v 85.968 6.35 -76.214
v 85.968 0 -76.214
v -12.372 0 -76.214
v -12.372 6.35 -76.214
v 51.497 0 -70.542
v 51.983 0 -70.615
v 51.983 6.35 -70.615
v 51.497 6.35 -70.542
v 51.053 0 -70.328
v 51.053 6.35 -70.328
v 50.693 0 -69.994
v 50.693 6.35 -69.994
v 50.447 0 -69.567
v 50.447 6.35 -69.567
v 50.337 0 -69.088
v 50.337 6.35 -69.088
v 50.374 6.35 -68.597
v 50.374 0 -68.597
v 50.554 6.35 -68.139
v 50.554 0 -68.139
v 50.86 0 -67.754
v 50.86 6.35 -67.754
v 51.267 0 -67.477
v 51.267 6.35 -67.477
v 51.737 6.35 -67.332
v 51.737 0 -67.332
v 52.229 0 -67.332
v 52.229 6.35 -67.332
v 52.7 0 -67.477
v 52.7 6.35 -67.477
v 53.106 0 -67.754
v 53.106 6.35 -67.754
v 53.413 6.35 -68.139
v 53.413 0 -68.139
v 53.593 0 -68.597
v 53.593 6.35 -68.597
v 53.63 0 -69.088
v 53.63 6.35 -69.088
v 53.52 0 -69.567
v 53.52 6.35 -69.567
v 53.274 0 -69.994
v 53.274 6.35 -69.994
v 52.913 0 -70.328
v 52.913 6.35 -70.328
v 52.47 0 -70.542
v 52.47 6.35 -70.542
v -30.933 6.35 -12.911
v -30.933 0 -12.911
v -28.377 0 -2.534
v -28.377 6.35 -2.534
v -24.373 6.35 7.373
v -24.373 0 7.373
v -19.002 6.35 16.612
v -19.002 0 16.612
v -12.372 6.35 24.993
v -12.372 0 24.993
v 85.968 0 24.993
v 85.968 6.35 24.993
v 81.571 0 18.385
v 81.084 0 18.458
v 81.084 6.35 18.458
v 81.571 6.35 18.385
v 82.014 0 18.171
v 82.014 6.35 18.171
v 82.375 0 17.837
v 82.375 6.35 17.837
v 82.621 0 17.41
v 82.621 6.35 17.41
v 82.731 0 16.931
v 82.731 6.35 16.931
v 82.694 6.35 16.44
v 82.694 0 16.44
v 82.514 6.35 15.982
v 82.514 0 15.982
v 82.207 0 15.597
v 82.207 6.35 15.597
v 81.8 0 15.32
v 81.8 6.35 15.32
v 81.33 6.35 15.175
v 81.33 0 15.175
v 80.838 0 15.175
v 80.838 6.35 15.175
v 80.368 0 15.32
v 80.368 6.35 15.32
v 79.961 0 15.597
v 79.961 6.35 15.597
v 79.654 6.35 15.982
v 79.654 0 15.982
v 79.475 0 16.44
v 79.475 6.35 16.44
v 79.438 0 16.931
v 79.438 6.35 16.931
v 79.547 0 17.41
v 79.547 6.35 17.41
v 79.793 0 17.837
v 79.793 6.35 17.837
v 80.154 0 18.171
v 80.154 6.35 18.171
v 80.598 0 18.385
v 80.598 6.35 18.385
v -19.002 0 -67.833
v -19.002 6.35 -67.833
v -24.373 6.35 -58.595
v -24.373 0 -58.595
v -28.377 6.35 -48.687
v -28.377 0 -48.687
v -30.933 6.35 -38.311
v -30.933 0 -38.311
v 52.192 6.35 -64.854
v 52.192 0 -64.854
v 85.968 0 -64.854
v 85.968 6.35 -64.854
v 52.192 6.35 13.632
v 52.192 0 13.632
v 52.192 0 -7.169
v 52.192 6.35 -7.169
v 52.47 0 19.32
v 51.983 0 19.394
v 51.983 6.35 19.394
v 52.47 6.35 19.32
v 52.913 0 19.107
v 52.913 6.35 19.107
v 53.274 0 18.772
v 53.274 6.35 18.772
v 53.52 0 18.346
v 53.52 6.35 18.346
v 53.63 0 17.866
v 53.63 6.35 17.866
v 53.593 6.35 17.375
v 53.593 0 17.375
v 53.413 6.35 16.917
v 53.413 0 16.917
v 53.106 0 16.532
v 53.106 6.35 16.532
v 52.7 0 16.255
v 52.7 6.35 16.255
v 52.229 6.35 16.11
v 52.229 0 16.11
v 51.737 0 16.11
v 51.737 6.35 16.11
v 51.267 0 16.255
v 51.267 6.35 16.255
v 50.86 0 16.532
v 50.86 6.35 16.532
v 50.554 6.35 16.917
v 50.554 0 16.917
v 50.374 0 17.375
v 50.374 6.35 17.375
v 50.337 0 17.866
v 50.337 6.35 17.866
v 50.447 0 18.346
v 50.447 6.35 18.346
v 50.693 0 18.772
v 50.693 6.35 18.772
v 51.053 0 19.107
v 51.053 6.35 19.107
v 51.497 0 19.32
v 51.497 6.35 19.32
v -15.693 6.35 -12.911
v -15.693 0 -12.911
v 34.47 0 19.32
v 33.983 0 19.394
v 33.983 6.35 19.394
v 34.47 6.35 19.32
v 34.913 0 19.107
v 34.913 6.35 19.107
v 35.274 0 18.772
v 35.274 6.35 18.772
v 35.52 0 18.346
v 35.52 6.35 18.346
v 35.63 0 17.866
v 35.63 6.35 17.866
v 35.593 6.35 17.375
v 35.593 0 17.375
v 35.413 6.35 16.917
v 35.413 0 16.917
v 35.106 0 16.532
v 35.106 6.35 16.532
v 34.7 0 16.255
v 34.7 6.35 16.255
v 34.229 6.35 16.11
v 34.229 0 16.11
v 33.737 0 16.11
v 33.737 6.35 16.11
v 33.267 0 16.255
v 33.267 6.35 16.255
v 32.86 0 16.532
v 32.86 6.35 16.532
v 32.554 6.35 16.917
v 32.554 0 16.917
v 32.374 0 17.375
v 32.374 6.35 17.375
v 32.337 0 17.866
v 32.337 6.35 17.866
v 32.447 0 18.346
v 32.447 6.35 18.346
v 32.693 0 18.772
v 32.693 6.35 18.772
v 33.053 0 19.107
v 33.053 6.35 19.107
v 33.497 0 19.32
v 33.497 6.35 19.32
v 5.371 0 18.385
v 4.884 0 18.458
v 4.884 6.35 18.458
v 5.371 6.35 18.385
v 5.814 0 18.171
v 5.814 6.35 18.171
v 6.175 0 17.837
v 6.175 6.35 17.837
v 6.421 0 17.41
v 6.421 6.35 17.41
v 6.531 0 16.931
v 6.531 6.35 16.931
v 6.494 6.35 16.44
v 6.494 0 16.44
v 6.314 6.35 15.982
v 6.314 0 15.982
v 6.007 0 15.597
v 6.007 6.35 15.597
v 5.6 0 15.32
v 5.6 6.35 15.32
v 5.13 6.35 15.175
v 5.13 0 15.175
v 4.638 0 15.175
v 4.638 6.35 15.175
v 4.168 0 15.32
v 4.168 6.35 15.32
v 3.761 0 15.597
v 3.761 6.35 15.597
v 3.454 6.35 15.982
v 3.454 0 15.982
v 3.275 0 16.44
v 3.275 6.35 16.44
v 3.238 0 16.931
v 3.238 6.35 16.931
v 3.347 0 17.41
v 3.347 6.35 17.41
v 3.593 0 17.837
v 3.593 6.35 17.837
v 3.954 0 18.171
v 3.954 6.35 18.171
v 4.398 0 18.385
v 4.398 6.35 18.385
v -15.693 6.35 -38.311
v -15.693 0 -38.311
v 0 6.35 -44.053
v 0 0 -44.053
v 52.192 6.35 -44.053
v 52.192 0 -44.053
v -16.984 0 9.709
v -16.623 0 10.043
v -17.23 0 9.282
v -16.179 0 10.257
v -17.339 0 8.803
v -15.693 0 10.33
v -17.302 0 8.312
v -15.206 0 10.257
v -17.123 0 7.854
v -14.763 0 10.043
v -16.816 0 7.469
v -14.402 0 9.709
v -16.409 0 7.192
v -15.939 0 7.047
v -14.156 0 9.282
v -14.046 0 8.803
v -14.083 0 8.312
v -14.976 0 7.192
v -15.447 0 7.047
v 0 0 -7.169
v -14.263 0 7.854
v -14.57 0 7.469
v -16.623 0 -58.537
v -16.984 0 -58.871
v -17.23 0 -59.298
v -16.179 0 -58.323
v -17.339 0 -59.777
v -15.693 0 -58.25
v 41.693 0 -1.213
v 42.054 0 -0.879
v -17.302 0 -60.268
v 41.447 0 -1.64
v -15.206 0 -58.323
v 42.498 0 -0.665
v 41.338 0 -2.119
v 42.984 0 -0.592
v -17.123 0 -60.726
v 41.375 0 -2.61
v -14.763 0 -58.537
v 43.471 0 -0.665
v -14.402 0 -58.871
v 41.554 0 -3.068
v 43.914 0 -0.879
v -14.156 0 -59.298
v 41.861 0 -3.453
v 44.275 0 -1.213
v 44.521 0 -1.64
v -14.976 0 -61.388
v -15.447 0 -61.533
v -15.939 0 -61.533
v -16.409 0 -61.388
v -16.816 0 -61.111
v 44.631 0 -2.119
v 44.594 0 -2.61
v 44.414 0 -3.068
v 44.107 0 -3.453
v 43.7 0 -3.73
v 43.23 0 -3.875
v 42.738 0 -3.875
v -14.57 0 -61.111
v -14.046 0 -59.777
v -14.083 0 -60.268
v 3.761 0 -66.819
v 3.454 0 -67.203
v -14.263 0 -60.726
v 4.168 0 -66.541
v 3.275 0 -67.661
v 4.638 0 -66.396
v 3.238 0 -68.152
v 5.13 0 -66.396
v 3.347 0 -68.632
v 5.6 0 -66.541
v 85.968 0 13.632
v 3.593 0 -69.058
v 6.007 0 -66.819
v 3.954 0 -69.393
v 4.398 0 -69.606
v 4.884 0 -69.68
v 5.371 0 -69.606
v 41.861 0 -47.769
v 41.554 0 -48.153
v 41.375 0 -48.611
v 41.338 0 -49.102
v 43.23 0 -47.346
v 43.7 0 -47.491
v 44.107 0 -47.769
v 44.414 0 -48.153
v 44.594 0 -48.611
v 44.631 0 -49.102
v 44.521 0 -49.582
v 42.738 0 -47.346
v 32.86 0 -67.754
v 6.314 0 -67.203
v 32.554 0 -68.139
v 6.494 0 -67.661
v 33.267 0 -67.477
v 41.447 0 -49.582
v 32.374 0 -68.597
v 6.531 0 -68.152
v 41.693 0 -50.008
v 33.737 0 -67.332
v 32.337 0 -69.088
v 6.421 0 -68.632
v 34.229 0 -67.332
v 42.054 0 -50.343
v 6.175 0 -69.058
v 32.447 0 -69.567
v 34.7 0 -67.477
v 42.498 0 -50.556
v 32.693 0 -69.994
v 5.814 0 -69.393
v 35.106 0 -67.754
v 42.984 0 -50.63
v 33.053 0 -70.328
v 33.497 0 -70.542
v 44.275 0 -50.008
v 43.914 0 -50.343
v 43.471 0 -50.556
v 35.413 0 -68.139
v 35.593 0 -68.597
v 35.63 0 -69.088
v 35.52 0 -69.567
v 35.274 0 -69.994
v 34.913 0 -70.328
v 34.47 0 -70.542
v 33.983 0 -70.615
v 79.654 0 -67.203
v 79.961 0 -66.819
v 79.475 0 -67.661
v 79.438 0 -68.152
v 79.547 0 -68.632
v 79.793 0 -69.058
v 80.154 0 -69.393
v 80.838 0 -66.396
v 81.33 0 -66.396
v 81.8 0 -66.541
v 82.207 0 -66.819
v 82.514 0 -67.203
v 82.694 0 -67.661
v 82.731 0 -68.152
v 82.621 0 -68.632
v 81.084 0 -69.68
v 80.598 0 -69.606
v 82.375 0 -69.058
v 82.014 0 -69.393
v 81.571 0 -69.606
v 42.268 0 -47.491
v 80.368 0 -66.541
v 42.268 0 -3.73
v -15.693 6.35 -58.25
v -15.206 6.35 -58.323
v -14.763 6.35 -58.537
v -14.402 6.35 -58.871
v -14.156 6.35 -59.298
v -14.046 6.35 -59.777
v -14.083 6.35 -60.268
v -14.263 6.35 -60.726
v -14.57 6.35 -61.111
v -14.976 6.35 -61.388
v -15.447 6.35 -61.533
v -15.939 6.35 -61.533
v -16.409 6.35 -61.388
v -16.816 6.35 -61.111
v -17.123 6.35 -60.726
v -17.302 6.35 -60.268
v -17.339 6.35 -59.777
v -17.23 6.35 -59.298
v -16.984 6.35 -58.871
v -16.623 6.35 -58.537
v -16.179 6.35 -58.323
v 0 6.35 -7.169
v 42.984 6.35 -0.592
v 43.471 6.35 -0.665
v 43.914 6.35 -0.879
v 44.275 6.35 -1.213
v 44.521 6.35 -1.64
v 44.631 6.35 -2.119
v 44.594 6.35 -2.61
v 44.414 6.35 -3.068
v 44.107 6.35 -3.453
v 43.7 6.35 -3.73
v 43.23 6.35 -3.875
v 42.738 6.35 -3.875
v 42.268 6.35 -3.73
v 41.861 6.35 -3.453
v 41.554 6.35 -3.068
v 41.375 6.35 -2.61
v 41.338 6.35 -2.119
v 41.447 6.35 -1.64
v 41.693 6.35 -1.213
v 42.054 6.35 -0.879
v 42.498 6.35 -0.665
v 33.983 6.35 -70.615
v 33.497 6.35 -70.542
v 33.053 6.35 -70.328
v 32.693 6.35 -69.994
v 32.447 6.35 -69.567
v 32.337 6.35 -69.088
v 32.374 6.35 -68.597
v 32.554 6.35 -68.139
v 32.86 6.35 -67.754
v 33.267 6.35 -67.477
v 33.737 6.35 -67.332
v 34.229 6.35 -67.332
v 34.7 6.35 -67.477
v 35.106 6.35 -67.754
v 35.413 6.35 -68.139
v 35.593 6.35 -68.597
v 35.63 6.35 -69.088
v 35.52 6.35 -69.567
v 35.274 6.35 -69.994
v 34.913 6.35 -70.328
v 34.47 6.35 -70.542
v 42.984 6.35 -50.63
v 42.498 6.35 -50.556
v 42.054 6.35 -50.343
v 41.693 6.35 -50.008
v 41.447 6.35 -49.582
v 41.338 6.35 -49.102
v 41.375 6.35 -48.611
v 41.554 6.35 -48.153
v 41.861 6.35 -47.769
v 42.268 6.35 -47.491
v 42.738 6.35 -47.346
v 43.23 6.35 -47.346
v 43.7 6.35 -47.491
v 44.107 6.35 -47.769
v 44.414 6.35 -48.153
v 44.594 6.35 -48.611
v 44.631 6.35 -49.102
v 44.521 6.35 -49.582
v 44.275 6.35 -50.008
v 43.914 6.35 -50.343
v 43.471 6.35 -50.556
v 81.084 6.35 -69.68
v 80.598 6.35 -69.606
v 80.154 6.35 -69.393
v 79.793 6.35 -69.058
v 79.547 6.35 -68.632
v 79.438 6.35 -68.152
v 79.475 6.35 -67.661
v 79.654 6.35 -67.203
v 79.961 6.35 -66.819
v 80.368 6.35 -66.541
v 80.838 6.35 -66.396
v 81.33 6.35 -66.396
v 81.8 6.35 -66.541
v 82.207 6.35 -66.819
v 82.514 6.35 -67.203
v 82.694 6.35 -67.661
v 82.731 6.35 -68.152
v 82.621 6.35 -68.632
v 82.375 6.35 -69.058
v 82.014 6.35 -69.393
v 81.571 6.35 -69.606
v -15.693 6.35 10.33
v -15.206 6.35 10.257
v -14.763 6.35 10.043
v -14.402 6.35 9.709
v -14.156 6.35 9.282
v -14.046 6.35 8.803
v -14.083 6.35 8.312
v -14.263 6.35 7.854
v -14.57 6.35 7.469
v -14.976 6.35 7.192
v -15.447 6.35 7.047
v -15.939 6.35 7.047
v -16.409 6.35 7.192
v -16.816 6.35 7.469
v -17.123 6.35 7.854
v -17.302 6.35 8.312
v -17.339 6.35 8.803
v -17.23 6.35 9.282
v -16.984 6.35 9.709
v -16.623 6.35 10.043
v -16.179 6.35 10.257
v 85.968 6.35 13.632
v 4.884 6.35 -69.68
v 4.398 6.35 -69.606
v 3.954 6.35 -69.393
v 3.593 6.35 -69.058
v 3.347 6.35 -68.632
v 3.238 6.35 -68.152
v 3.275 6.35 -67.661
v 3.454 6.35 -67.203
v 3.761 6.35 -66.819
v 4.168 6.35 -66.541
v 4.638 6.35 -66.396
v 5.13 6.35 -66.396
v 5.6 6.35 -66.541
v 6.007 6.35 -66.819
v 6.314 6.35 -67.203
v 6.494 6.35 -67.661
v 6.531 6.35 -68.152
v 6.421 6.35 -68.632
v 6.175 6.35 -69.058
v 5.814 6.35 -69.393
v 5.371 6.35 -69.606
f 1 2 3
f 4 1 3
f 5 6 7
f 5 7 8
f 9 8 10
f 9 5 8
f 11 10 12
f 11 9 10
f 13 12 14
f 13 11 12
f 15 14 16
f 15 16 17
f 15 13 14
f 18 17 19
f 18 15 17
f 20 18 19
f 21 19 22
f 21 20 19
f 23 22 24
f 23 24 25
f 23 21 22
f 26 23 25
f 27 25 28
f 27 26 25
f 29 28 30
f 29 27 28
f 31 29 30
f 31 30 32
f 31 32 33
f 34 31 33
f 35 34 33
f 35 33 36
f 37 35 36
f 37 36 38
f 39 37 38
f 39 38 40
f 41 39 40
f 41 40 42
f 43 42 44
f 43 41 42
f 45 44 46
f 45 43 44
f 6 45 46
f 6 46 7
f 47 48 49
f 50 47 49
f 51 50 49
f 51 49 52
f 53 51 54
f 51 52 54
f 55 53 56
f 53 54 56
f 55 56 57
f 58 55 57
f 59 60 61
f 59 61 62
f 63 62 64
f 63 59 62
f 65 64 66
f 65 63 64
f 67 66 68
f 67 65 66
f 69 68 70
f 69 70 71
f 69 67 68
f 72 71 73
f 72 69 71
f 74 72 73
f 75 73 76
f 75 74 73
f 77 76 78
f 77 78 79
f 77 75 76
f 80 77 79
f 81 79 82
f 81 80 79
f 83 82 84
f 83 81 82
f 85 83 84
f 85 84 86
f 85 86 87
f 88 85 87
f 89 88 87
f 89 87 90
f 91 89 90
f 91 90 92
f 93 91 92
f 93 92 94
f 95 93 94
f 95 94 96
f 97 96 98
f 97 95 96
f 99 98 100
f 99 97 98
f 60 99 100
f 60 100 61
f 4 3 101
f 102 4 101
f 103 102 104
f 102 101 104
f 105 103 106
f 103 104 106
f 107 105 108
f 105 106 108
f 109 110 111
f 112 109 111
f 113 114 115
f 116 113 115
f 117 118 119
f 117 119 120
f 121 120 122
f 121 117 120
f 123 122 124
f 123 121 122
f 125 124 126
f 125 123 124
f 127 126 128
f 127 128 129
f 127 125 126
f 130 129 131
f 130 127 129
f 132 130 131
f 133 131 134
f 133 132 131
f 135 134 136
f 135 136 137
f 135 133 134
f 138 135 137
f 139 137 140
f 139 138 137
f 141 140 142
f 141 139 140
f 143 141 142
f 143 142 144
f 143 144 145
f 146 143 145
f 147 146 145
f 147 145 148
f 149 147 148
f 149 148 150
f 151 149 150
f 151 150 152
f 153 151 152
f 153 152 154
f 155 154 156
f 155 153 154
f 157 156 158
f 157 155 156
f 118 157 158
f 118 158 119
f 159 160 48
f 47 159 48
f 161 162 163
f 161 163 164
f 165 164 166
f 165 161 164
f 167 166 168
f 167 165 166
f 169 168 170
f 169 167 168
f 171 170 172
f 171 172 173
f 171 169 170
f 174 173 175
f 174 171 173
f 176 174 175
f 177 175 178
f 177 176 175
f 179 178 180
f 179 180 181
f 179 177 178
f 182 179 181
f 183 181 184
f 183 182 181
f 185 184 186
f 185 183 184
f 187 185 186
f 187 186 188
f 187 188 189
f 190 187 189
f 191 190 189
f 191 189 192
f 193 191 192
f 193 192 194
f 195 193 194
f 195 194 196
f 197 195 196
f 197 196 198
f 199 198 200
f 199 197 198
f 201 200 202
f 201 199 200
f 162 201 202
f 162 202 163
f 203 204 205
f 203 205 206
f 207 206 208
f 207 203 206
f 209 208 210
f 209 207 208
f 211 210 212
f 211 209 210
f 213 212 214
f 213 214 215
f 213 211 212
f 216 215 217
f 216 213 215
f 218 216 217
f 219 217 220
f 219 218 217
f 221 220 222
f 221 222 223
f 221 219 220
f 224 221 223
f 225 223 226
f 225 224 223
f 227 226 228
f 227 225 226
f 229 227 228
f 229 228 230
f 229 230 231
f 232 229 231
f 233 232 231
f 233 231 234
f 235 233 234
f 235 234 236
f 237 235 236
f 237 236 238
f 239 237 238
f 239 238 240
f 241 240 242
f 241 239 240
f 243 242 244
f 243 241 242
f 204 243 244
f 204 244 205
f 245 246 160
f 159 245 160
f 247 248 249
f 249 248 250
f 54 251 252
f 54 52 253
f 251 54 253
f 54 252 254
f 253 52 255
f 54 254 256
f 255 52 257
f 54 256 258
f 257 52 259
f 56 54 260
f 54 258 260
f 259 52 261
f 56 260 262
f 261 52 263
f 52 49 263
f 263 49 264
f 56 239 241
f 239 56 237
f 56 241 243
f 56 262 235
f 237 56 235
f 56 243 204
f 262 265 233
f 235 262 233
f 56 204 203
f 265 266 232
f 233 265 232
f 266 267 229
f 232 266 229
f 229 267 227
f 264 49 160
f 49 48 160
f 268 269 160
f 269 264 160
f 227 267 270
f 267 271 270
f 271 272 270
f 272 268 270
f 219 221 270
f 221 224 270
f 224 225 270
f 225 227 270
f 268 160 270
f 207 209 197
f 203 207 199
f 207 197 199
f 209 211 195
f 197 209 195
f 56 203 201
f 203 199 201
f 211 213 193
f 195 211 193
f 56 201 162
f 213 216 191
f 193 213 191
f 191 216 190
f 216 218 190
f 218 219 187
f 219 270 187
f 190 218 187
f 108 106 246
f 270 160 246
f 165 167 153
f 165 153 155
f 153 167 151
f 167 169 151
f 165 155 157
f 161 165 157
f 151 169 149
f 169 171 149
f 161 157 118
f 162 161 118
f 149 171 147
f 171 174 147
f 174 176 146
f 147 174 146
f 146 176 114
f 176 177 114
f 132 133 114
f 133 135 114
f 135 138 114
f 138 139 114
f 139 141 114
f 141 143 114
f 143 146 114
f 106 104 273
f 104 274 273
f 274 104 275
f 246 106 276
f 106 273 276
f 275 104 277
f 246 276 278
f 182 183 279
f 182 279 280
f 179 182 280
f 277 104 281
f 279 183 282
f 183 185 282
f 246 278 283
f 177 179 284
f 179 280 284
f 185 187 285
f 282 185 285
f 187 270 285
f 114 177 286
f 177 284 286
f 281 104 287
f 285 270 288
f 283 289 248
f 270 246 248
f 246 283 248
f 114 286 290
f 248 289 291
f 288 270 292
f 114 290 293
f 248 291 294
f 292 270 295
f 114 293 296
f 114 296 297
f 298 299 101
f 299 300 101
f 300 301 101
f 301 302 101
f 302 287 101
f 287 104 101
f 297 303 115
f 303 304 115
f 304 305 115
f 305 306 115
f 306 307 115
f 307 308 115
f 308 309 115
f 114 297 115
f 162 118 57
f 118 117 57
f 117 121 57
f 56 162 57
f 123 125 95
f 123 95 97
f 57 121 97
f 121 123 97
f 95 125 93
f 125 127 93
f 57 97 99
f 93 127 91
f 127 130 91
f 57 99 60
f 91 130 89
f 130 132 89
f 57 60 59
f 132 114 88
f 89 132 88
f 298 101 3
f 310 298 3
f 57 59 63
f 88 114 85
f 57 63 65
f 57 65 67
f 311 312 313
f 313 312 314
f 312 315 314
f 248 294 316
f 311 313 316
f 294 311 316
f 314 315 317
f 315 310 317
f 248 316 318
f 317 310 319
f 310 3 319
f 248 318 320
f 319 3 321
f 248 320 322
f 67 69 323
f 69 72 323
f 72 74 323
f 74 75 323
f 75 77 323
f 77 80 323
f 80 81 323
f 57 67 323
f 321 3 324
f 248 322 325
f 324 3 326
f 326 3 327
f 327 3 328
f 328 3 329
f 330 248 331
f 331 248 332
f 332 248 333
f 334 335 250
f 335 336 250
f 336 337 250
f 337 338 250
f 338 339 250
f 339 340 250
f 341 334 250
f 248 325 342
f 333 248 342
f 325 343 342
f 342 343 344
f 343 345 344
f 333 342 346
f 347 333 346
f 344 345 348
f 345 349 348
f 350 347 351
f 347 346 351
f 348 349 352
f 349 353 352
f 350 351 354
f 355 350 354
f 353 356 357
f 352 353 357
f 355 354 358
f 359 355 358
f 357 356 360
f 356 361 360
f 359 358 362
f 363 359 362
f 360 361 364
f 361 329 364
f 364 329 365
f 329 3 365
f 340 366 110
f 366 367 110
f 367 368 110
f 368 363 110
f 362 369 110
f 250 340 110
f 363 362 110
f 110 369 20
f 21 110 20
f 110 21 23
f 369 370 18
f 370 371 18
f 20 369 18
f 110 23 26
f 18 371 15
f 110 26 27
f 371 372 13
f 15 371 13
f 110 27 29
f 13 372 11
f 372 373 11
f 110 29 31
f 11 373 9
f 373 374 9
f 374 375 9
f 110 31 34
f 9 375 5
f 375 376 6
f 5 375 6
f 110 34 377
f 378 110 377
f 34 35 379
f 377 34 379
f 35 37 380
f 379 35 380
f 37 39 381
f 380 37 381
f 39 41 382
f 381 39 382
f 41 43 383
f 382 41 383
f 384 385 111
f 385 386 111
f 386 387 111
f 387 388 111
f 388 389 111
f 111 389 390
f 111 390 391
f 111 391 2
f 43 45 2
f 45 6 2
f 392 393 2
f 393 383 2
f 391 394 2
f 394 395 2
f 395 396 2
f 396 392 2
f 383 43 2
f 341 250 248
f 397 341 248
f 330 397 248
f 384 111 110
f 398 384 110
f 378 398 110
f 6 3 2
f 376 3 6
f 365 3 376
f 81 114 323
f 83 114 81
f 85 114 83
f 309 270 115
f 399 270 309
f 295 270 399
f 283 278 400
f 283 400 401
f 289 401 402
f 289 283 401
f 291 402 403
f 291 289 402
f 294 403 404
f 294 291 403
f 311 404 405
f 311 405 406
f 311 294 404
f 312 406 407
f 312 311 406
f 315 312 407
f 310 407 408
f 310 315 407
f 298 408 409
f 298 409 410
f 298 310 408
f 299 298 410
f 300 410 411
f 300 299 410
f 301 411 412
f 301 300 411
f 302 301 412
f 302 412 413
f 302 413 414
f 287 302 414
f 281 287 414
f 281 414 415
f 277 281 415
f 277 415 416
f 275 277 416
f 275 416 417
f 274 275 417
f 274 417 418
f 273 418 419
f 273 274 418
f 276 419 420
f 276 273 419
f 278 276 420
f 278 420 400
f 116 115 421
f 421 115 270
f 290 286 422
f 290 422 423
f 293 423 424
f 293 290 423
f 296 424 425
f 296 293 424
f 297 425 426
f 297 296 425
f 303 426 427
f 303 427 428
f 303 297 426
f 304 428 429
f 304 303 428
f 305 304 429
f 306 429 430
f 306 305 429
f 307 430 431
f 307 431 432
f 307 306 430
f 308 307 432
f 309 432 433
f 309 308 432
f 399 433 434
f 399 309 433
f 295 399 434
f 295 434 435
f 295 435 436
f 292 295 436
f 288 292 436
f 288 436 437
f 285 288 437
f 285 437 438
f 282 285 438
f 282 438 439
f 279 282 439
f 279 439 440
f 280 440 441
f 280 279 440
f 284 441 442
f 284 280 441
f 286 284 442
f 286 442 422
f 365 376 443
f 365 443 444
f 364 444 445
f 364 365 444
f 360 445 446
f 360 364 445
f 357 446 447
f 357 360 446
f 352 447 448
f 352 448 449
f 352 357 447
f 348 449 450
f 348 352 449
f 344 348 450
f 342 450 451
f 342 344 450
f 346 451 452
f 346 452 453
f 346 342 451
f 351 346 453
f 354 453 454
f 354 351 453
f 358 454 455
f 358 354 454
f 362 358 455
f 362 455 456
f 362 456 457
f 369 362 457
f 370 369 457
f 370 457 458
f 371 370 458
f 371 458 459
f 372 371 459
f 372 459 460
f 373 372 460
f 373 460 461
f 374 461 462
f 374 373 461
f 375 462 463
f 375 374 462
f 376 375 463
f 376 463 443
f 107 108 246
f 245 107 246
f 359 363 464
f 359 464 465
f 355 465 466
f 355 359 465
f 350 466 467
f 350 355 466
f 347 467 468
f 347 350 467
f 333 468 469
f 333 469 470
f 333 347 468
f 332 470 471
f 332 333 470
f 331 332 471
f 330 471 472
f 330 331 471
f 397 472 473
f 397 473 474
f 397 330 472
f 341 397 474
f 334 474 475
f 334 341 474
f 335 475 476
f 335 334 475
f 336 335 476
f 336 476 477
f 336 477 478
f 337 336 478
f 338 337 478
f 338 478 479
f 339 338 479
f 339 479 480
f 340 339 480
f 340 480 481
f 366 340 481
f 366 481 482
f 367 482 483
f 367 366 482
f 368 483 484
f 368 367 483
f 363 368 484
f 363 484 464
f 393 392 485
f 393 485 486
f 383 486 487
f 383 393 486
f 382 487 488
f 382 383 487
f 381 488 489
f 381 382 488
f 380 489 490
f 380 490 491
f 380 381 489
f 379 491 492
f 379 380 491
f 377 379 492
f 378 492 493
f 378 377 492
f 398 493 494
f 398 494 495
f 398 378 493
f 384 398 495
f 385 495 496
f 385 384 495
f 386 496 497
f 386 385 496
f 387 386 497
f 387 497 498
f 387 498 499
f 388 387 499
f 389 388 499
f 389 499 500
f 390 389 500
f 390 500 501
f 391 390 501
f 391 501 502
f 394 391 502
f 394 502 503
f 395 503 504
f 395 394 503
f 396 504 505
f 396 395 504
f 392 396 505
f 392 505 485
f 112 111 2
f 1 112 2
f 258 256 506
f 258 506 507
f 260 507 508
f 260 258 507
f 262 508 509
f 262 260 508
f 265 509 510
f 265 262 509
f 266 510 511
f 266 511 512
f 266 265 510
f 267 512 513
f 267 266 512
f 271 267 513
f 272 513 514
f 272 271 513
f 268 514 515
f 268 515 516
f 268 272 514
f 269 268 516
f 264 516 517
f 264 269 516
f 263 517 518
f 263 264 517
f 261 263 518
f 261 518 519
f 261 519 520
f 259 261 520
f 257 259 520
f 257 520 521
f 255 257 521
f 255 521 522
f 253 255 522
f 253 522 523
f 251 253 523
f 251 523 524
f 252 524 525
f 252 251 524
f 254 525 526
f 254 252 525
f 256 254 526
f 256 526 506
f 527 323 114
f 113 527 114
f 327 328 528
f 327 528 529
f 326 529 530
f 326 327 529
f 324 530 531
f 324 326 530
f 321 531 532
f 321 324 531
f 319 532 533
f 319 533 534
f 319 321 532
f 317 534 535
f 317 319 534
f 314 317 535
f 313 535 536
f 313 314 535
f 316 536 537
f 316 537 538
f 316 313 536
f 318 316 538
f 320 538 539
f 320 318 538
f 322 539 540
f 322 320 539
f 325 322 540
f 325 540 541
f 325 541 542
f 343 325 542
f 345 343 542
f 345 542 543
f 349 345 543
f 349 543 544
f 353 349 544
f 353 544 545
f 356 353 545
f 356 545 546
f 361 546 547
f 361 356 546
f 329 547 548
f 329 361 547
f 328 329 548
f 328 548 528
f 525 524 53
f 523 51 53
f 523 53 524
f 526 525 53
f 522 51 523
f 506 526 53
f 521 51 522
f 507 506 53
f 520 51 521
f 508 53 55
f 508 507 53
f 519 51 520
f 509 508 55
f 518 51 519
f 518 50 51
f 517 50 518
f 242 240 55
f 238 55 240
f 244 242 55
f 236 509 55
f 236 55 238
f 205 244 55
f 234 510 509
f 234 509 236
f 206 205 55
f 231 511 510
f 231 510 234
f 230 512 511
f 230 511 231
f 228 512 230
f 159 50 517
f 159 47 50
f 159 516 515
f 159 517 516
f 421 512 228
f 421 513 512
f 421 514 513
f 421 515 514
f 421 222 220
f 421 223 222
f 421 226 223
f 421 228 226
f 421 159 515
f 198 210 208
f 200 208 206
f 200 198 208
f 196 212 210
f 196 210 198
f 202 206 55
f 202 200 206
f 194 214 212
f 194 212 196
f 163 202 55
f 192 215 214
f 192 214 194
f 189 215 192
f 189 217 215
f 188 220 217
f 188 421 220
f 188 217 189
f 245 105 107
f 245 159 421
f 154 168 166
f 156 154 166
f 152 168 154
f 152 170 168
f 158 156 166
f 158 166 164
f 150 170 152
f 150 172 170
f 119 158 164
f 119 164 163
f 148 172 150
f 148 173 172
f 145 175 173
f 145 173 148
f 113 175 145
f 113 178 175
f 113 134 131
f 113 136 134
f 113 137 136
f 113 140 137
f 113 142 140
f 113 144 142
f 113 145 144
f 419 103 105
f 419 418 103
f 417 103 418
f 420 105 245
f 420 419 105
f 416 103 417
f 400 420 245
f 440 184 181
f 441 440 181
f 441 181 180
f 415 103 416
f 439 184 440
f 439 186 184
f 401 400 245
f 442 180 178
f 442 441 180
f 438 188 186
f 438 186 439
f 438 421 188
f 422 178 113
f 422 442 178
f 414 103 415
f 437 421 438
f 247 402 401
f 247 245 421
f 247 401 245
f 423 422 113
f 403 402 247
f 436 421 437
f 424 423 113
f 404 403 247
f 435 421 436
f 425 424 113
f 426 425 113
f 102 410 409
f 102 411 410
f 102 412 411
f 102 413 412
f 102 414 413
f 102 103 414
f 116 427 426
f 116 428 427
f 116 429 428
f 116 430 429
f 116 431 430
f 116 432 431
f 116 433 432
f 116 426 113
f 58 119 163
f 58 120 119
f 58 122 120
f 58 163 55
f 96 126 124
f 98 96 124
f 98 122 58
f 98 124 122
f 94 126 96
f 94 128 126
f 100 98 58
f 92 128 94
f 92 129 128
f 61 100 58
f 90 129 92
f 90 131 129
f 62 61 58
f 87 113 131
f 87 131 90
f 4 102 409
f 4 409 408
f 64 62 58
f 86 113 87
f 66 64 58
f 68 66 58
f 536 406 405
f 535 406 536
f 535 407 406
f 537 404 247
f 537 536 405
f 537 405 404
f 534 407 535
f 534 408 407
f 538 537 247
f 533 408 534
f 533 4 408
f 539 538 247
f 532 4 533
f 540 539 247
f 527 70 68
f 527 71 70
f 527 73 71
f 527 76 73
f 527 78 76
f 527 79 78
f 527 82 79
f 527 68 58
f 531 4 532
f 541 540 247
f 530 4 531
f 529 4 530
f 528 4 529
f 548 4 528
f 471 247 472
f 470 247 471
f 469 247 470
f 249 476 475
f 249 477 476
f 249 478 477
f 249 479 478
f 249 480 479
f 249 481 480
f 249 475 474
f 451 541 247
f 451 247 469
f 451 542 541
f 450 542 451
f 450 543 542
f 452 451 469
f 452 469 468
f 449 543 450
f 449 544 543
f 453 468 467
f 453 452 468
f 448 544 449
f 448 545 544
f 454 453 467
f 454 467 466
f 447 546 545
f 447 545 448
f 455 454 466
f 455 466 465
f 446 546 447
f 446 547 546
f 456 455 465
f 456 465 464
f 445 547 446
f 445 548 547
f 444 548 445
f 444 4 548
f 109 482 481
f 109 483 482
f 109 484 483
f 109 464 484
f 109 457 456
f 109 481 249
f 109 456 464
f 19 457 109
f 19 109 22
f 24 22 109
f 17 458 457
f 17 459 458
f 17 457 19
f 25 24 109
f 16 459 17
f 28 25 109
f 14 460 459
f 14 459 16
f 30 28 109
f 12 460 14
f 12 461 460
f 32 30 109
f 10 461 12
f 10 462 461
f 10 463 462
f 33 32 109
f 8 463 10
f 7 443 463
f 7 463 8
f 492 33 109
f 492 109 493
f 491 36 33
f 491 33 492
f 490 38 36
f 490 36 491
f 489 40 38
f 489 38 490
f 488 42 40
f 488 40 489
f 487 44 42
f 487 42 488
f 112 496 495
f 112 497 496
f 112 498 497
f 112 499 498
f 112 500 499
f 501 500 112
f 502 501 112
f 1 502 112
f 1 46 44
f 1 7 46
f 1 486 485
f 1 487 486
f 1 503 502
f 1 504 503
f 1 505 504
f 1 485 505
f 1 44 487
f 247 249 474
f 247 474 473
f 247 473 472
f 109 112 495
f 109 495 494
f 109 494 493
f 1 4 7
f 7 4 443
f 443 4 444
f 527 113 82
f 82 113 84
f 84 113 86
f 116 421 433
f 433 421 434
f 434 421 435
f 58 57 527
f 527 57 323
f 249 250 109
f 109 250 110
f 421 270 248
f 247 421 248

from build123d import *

# Parameters (mm, degrees)
SKETCH1_R           = 1.651
BOSS_EXTRUDE1_DEPTH = 6.35


with BuildPart() as part:
    # Sketch1 → Boss-Extrude1 (new body)
    with BuildSketch(Plane(origin=(0, 0, 0), x_dir=(1, 0, 0), z_dir=(0, 1, 0))):
        with BuildLine():
            Line((33.776652136, 7.168881649), (0, 7.168881649))
            Line((0, 7.168881649), (0, 44.052727236))
            Line((0, 44.052727236), (33.776652136, 44.052727236))
            Line((33.776652136, 44.052727236), (52.191652136, 44.052727236))
            Line((52.191652136, 44.052727236), (52.191652136, 64.853804442))
            Line((52.191652136, 64.853804442), (85.968304273, 64.853804442))
            Line((85.968304273, 64.853804442), (85.968304273, 76.214266248))
            Line((85.968304273, 76.214266248), (0, 76.214266248))
            Line((0, 76.214266248), (-12.371874213, 76.214266248))
            ThreePointArc((-12.371874213, 76.214266248), (-24.373410945, 58.595023332), (-30.932760678, 38.310804442))
            Line((-30.932760678, 38.310804442), (-15.692760678, 38.310804442))
            Line((-15.692760678, 38.310804442), (-15.692760678, 12.910804442))
            Line((-15.692760678, 12.910804442), (-30.932760678, 12.910804442))
            ThreePointArc((-30.932760678, 12.910804442), (-24.373410945, -7.373414447), (-12.371874213, -24.992657364))
            Line((-12.371874213, -24.992657364), (0, -24.992657364))
            Line((0, -24.992657364), (85.968304273, -24.992657364))
            Line((85.968304273, -24.992657364), (85.968304273, -13.632195558))
            Line((85.968304273, -13.632195558), (52.191652136, -13.632195558))
            Line((52.191652136, -13.632195558), (52.191652136, 7.168881649))
            Line((52.191652136, 7.168881649), (33.776652136, 7.168881649))
        make_face()
        with Locations(Location((4.884152136, -16.807195558, 0), (0, 0, 270))):
            Circle(SKETCH1_R, mode=Mode.SUBTRACT)
        with Locations(Location((81.084152136, -16.807195558, 0), (0, 0, 270))):
            Circle(SKETCH1_R, mode=Mode.SUBTRACT)
        with Locations(Location((42.984152136, 2.242804442, 0), (0, 0, 270))):
            Circle(SKETCH1_R, mode=Mode.SUBTRACT)
        with Locations(Location((33.983402136, -17.742657364, 0), (0, 0, 270))):
            Circle(SKETCH1_R, mode=Mode.SUBTRACT)
        with Locations(Location((51.983402136, -17.742657364, 0), (0, 0, 270))):
            Circle(SKETCH1_R, mode=Mode.SUBTRACT)
        with Locations(Location((51.983402136, 68.964266248, 0), (0, 0, 90))):
            Circle(SKETCH1_R, mode=Mode.SUBTRACT)
        with Locations(Location((33.983402136, 68.964266248, 0), (0, 0, 90))):
            Circle(SKETCH1_R, mode=Mode.SUBTRACT)
        with Locations(Location((42.984152136, 48.978804442, 0), (0, 0, 90))):
            Circle(SKETCH1_R, mode=Mode.SUBTRACT)
        with Locations(Location((81.084152136, 68.028804442, 0), (0, 0, 90))):
            Circle(SKETCH1_R, mode=Mode.SUBTRACT)
        with Locations(Location((4.884152136, 68.028804442, 0), (0, 0, 90))):
            Circle(SKETCH1_R, mode=Mode.SUBTRACT)
        with Locations(Location((-15.692760678, 59.900804442, 0), (0, 0, 270))):
            Circle(SKETCH1_R, mode=Mode.SUBTRACT)
        with Locations(Location((-15.692760678, -8.679195558, 0), (0, 0, 270))):
            Circle(SKETCH1_R, mode=Mode.SUBTRACT)
    extrude(amount=BOSS_EXTRUDE1_DEPTH)


solid = part.part
